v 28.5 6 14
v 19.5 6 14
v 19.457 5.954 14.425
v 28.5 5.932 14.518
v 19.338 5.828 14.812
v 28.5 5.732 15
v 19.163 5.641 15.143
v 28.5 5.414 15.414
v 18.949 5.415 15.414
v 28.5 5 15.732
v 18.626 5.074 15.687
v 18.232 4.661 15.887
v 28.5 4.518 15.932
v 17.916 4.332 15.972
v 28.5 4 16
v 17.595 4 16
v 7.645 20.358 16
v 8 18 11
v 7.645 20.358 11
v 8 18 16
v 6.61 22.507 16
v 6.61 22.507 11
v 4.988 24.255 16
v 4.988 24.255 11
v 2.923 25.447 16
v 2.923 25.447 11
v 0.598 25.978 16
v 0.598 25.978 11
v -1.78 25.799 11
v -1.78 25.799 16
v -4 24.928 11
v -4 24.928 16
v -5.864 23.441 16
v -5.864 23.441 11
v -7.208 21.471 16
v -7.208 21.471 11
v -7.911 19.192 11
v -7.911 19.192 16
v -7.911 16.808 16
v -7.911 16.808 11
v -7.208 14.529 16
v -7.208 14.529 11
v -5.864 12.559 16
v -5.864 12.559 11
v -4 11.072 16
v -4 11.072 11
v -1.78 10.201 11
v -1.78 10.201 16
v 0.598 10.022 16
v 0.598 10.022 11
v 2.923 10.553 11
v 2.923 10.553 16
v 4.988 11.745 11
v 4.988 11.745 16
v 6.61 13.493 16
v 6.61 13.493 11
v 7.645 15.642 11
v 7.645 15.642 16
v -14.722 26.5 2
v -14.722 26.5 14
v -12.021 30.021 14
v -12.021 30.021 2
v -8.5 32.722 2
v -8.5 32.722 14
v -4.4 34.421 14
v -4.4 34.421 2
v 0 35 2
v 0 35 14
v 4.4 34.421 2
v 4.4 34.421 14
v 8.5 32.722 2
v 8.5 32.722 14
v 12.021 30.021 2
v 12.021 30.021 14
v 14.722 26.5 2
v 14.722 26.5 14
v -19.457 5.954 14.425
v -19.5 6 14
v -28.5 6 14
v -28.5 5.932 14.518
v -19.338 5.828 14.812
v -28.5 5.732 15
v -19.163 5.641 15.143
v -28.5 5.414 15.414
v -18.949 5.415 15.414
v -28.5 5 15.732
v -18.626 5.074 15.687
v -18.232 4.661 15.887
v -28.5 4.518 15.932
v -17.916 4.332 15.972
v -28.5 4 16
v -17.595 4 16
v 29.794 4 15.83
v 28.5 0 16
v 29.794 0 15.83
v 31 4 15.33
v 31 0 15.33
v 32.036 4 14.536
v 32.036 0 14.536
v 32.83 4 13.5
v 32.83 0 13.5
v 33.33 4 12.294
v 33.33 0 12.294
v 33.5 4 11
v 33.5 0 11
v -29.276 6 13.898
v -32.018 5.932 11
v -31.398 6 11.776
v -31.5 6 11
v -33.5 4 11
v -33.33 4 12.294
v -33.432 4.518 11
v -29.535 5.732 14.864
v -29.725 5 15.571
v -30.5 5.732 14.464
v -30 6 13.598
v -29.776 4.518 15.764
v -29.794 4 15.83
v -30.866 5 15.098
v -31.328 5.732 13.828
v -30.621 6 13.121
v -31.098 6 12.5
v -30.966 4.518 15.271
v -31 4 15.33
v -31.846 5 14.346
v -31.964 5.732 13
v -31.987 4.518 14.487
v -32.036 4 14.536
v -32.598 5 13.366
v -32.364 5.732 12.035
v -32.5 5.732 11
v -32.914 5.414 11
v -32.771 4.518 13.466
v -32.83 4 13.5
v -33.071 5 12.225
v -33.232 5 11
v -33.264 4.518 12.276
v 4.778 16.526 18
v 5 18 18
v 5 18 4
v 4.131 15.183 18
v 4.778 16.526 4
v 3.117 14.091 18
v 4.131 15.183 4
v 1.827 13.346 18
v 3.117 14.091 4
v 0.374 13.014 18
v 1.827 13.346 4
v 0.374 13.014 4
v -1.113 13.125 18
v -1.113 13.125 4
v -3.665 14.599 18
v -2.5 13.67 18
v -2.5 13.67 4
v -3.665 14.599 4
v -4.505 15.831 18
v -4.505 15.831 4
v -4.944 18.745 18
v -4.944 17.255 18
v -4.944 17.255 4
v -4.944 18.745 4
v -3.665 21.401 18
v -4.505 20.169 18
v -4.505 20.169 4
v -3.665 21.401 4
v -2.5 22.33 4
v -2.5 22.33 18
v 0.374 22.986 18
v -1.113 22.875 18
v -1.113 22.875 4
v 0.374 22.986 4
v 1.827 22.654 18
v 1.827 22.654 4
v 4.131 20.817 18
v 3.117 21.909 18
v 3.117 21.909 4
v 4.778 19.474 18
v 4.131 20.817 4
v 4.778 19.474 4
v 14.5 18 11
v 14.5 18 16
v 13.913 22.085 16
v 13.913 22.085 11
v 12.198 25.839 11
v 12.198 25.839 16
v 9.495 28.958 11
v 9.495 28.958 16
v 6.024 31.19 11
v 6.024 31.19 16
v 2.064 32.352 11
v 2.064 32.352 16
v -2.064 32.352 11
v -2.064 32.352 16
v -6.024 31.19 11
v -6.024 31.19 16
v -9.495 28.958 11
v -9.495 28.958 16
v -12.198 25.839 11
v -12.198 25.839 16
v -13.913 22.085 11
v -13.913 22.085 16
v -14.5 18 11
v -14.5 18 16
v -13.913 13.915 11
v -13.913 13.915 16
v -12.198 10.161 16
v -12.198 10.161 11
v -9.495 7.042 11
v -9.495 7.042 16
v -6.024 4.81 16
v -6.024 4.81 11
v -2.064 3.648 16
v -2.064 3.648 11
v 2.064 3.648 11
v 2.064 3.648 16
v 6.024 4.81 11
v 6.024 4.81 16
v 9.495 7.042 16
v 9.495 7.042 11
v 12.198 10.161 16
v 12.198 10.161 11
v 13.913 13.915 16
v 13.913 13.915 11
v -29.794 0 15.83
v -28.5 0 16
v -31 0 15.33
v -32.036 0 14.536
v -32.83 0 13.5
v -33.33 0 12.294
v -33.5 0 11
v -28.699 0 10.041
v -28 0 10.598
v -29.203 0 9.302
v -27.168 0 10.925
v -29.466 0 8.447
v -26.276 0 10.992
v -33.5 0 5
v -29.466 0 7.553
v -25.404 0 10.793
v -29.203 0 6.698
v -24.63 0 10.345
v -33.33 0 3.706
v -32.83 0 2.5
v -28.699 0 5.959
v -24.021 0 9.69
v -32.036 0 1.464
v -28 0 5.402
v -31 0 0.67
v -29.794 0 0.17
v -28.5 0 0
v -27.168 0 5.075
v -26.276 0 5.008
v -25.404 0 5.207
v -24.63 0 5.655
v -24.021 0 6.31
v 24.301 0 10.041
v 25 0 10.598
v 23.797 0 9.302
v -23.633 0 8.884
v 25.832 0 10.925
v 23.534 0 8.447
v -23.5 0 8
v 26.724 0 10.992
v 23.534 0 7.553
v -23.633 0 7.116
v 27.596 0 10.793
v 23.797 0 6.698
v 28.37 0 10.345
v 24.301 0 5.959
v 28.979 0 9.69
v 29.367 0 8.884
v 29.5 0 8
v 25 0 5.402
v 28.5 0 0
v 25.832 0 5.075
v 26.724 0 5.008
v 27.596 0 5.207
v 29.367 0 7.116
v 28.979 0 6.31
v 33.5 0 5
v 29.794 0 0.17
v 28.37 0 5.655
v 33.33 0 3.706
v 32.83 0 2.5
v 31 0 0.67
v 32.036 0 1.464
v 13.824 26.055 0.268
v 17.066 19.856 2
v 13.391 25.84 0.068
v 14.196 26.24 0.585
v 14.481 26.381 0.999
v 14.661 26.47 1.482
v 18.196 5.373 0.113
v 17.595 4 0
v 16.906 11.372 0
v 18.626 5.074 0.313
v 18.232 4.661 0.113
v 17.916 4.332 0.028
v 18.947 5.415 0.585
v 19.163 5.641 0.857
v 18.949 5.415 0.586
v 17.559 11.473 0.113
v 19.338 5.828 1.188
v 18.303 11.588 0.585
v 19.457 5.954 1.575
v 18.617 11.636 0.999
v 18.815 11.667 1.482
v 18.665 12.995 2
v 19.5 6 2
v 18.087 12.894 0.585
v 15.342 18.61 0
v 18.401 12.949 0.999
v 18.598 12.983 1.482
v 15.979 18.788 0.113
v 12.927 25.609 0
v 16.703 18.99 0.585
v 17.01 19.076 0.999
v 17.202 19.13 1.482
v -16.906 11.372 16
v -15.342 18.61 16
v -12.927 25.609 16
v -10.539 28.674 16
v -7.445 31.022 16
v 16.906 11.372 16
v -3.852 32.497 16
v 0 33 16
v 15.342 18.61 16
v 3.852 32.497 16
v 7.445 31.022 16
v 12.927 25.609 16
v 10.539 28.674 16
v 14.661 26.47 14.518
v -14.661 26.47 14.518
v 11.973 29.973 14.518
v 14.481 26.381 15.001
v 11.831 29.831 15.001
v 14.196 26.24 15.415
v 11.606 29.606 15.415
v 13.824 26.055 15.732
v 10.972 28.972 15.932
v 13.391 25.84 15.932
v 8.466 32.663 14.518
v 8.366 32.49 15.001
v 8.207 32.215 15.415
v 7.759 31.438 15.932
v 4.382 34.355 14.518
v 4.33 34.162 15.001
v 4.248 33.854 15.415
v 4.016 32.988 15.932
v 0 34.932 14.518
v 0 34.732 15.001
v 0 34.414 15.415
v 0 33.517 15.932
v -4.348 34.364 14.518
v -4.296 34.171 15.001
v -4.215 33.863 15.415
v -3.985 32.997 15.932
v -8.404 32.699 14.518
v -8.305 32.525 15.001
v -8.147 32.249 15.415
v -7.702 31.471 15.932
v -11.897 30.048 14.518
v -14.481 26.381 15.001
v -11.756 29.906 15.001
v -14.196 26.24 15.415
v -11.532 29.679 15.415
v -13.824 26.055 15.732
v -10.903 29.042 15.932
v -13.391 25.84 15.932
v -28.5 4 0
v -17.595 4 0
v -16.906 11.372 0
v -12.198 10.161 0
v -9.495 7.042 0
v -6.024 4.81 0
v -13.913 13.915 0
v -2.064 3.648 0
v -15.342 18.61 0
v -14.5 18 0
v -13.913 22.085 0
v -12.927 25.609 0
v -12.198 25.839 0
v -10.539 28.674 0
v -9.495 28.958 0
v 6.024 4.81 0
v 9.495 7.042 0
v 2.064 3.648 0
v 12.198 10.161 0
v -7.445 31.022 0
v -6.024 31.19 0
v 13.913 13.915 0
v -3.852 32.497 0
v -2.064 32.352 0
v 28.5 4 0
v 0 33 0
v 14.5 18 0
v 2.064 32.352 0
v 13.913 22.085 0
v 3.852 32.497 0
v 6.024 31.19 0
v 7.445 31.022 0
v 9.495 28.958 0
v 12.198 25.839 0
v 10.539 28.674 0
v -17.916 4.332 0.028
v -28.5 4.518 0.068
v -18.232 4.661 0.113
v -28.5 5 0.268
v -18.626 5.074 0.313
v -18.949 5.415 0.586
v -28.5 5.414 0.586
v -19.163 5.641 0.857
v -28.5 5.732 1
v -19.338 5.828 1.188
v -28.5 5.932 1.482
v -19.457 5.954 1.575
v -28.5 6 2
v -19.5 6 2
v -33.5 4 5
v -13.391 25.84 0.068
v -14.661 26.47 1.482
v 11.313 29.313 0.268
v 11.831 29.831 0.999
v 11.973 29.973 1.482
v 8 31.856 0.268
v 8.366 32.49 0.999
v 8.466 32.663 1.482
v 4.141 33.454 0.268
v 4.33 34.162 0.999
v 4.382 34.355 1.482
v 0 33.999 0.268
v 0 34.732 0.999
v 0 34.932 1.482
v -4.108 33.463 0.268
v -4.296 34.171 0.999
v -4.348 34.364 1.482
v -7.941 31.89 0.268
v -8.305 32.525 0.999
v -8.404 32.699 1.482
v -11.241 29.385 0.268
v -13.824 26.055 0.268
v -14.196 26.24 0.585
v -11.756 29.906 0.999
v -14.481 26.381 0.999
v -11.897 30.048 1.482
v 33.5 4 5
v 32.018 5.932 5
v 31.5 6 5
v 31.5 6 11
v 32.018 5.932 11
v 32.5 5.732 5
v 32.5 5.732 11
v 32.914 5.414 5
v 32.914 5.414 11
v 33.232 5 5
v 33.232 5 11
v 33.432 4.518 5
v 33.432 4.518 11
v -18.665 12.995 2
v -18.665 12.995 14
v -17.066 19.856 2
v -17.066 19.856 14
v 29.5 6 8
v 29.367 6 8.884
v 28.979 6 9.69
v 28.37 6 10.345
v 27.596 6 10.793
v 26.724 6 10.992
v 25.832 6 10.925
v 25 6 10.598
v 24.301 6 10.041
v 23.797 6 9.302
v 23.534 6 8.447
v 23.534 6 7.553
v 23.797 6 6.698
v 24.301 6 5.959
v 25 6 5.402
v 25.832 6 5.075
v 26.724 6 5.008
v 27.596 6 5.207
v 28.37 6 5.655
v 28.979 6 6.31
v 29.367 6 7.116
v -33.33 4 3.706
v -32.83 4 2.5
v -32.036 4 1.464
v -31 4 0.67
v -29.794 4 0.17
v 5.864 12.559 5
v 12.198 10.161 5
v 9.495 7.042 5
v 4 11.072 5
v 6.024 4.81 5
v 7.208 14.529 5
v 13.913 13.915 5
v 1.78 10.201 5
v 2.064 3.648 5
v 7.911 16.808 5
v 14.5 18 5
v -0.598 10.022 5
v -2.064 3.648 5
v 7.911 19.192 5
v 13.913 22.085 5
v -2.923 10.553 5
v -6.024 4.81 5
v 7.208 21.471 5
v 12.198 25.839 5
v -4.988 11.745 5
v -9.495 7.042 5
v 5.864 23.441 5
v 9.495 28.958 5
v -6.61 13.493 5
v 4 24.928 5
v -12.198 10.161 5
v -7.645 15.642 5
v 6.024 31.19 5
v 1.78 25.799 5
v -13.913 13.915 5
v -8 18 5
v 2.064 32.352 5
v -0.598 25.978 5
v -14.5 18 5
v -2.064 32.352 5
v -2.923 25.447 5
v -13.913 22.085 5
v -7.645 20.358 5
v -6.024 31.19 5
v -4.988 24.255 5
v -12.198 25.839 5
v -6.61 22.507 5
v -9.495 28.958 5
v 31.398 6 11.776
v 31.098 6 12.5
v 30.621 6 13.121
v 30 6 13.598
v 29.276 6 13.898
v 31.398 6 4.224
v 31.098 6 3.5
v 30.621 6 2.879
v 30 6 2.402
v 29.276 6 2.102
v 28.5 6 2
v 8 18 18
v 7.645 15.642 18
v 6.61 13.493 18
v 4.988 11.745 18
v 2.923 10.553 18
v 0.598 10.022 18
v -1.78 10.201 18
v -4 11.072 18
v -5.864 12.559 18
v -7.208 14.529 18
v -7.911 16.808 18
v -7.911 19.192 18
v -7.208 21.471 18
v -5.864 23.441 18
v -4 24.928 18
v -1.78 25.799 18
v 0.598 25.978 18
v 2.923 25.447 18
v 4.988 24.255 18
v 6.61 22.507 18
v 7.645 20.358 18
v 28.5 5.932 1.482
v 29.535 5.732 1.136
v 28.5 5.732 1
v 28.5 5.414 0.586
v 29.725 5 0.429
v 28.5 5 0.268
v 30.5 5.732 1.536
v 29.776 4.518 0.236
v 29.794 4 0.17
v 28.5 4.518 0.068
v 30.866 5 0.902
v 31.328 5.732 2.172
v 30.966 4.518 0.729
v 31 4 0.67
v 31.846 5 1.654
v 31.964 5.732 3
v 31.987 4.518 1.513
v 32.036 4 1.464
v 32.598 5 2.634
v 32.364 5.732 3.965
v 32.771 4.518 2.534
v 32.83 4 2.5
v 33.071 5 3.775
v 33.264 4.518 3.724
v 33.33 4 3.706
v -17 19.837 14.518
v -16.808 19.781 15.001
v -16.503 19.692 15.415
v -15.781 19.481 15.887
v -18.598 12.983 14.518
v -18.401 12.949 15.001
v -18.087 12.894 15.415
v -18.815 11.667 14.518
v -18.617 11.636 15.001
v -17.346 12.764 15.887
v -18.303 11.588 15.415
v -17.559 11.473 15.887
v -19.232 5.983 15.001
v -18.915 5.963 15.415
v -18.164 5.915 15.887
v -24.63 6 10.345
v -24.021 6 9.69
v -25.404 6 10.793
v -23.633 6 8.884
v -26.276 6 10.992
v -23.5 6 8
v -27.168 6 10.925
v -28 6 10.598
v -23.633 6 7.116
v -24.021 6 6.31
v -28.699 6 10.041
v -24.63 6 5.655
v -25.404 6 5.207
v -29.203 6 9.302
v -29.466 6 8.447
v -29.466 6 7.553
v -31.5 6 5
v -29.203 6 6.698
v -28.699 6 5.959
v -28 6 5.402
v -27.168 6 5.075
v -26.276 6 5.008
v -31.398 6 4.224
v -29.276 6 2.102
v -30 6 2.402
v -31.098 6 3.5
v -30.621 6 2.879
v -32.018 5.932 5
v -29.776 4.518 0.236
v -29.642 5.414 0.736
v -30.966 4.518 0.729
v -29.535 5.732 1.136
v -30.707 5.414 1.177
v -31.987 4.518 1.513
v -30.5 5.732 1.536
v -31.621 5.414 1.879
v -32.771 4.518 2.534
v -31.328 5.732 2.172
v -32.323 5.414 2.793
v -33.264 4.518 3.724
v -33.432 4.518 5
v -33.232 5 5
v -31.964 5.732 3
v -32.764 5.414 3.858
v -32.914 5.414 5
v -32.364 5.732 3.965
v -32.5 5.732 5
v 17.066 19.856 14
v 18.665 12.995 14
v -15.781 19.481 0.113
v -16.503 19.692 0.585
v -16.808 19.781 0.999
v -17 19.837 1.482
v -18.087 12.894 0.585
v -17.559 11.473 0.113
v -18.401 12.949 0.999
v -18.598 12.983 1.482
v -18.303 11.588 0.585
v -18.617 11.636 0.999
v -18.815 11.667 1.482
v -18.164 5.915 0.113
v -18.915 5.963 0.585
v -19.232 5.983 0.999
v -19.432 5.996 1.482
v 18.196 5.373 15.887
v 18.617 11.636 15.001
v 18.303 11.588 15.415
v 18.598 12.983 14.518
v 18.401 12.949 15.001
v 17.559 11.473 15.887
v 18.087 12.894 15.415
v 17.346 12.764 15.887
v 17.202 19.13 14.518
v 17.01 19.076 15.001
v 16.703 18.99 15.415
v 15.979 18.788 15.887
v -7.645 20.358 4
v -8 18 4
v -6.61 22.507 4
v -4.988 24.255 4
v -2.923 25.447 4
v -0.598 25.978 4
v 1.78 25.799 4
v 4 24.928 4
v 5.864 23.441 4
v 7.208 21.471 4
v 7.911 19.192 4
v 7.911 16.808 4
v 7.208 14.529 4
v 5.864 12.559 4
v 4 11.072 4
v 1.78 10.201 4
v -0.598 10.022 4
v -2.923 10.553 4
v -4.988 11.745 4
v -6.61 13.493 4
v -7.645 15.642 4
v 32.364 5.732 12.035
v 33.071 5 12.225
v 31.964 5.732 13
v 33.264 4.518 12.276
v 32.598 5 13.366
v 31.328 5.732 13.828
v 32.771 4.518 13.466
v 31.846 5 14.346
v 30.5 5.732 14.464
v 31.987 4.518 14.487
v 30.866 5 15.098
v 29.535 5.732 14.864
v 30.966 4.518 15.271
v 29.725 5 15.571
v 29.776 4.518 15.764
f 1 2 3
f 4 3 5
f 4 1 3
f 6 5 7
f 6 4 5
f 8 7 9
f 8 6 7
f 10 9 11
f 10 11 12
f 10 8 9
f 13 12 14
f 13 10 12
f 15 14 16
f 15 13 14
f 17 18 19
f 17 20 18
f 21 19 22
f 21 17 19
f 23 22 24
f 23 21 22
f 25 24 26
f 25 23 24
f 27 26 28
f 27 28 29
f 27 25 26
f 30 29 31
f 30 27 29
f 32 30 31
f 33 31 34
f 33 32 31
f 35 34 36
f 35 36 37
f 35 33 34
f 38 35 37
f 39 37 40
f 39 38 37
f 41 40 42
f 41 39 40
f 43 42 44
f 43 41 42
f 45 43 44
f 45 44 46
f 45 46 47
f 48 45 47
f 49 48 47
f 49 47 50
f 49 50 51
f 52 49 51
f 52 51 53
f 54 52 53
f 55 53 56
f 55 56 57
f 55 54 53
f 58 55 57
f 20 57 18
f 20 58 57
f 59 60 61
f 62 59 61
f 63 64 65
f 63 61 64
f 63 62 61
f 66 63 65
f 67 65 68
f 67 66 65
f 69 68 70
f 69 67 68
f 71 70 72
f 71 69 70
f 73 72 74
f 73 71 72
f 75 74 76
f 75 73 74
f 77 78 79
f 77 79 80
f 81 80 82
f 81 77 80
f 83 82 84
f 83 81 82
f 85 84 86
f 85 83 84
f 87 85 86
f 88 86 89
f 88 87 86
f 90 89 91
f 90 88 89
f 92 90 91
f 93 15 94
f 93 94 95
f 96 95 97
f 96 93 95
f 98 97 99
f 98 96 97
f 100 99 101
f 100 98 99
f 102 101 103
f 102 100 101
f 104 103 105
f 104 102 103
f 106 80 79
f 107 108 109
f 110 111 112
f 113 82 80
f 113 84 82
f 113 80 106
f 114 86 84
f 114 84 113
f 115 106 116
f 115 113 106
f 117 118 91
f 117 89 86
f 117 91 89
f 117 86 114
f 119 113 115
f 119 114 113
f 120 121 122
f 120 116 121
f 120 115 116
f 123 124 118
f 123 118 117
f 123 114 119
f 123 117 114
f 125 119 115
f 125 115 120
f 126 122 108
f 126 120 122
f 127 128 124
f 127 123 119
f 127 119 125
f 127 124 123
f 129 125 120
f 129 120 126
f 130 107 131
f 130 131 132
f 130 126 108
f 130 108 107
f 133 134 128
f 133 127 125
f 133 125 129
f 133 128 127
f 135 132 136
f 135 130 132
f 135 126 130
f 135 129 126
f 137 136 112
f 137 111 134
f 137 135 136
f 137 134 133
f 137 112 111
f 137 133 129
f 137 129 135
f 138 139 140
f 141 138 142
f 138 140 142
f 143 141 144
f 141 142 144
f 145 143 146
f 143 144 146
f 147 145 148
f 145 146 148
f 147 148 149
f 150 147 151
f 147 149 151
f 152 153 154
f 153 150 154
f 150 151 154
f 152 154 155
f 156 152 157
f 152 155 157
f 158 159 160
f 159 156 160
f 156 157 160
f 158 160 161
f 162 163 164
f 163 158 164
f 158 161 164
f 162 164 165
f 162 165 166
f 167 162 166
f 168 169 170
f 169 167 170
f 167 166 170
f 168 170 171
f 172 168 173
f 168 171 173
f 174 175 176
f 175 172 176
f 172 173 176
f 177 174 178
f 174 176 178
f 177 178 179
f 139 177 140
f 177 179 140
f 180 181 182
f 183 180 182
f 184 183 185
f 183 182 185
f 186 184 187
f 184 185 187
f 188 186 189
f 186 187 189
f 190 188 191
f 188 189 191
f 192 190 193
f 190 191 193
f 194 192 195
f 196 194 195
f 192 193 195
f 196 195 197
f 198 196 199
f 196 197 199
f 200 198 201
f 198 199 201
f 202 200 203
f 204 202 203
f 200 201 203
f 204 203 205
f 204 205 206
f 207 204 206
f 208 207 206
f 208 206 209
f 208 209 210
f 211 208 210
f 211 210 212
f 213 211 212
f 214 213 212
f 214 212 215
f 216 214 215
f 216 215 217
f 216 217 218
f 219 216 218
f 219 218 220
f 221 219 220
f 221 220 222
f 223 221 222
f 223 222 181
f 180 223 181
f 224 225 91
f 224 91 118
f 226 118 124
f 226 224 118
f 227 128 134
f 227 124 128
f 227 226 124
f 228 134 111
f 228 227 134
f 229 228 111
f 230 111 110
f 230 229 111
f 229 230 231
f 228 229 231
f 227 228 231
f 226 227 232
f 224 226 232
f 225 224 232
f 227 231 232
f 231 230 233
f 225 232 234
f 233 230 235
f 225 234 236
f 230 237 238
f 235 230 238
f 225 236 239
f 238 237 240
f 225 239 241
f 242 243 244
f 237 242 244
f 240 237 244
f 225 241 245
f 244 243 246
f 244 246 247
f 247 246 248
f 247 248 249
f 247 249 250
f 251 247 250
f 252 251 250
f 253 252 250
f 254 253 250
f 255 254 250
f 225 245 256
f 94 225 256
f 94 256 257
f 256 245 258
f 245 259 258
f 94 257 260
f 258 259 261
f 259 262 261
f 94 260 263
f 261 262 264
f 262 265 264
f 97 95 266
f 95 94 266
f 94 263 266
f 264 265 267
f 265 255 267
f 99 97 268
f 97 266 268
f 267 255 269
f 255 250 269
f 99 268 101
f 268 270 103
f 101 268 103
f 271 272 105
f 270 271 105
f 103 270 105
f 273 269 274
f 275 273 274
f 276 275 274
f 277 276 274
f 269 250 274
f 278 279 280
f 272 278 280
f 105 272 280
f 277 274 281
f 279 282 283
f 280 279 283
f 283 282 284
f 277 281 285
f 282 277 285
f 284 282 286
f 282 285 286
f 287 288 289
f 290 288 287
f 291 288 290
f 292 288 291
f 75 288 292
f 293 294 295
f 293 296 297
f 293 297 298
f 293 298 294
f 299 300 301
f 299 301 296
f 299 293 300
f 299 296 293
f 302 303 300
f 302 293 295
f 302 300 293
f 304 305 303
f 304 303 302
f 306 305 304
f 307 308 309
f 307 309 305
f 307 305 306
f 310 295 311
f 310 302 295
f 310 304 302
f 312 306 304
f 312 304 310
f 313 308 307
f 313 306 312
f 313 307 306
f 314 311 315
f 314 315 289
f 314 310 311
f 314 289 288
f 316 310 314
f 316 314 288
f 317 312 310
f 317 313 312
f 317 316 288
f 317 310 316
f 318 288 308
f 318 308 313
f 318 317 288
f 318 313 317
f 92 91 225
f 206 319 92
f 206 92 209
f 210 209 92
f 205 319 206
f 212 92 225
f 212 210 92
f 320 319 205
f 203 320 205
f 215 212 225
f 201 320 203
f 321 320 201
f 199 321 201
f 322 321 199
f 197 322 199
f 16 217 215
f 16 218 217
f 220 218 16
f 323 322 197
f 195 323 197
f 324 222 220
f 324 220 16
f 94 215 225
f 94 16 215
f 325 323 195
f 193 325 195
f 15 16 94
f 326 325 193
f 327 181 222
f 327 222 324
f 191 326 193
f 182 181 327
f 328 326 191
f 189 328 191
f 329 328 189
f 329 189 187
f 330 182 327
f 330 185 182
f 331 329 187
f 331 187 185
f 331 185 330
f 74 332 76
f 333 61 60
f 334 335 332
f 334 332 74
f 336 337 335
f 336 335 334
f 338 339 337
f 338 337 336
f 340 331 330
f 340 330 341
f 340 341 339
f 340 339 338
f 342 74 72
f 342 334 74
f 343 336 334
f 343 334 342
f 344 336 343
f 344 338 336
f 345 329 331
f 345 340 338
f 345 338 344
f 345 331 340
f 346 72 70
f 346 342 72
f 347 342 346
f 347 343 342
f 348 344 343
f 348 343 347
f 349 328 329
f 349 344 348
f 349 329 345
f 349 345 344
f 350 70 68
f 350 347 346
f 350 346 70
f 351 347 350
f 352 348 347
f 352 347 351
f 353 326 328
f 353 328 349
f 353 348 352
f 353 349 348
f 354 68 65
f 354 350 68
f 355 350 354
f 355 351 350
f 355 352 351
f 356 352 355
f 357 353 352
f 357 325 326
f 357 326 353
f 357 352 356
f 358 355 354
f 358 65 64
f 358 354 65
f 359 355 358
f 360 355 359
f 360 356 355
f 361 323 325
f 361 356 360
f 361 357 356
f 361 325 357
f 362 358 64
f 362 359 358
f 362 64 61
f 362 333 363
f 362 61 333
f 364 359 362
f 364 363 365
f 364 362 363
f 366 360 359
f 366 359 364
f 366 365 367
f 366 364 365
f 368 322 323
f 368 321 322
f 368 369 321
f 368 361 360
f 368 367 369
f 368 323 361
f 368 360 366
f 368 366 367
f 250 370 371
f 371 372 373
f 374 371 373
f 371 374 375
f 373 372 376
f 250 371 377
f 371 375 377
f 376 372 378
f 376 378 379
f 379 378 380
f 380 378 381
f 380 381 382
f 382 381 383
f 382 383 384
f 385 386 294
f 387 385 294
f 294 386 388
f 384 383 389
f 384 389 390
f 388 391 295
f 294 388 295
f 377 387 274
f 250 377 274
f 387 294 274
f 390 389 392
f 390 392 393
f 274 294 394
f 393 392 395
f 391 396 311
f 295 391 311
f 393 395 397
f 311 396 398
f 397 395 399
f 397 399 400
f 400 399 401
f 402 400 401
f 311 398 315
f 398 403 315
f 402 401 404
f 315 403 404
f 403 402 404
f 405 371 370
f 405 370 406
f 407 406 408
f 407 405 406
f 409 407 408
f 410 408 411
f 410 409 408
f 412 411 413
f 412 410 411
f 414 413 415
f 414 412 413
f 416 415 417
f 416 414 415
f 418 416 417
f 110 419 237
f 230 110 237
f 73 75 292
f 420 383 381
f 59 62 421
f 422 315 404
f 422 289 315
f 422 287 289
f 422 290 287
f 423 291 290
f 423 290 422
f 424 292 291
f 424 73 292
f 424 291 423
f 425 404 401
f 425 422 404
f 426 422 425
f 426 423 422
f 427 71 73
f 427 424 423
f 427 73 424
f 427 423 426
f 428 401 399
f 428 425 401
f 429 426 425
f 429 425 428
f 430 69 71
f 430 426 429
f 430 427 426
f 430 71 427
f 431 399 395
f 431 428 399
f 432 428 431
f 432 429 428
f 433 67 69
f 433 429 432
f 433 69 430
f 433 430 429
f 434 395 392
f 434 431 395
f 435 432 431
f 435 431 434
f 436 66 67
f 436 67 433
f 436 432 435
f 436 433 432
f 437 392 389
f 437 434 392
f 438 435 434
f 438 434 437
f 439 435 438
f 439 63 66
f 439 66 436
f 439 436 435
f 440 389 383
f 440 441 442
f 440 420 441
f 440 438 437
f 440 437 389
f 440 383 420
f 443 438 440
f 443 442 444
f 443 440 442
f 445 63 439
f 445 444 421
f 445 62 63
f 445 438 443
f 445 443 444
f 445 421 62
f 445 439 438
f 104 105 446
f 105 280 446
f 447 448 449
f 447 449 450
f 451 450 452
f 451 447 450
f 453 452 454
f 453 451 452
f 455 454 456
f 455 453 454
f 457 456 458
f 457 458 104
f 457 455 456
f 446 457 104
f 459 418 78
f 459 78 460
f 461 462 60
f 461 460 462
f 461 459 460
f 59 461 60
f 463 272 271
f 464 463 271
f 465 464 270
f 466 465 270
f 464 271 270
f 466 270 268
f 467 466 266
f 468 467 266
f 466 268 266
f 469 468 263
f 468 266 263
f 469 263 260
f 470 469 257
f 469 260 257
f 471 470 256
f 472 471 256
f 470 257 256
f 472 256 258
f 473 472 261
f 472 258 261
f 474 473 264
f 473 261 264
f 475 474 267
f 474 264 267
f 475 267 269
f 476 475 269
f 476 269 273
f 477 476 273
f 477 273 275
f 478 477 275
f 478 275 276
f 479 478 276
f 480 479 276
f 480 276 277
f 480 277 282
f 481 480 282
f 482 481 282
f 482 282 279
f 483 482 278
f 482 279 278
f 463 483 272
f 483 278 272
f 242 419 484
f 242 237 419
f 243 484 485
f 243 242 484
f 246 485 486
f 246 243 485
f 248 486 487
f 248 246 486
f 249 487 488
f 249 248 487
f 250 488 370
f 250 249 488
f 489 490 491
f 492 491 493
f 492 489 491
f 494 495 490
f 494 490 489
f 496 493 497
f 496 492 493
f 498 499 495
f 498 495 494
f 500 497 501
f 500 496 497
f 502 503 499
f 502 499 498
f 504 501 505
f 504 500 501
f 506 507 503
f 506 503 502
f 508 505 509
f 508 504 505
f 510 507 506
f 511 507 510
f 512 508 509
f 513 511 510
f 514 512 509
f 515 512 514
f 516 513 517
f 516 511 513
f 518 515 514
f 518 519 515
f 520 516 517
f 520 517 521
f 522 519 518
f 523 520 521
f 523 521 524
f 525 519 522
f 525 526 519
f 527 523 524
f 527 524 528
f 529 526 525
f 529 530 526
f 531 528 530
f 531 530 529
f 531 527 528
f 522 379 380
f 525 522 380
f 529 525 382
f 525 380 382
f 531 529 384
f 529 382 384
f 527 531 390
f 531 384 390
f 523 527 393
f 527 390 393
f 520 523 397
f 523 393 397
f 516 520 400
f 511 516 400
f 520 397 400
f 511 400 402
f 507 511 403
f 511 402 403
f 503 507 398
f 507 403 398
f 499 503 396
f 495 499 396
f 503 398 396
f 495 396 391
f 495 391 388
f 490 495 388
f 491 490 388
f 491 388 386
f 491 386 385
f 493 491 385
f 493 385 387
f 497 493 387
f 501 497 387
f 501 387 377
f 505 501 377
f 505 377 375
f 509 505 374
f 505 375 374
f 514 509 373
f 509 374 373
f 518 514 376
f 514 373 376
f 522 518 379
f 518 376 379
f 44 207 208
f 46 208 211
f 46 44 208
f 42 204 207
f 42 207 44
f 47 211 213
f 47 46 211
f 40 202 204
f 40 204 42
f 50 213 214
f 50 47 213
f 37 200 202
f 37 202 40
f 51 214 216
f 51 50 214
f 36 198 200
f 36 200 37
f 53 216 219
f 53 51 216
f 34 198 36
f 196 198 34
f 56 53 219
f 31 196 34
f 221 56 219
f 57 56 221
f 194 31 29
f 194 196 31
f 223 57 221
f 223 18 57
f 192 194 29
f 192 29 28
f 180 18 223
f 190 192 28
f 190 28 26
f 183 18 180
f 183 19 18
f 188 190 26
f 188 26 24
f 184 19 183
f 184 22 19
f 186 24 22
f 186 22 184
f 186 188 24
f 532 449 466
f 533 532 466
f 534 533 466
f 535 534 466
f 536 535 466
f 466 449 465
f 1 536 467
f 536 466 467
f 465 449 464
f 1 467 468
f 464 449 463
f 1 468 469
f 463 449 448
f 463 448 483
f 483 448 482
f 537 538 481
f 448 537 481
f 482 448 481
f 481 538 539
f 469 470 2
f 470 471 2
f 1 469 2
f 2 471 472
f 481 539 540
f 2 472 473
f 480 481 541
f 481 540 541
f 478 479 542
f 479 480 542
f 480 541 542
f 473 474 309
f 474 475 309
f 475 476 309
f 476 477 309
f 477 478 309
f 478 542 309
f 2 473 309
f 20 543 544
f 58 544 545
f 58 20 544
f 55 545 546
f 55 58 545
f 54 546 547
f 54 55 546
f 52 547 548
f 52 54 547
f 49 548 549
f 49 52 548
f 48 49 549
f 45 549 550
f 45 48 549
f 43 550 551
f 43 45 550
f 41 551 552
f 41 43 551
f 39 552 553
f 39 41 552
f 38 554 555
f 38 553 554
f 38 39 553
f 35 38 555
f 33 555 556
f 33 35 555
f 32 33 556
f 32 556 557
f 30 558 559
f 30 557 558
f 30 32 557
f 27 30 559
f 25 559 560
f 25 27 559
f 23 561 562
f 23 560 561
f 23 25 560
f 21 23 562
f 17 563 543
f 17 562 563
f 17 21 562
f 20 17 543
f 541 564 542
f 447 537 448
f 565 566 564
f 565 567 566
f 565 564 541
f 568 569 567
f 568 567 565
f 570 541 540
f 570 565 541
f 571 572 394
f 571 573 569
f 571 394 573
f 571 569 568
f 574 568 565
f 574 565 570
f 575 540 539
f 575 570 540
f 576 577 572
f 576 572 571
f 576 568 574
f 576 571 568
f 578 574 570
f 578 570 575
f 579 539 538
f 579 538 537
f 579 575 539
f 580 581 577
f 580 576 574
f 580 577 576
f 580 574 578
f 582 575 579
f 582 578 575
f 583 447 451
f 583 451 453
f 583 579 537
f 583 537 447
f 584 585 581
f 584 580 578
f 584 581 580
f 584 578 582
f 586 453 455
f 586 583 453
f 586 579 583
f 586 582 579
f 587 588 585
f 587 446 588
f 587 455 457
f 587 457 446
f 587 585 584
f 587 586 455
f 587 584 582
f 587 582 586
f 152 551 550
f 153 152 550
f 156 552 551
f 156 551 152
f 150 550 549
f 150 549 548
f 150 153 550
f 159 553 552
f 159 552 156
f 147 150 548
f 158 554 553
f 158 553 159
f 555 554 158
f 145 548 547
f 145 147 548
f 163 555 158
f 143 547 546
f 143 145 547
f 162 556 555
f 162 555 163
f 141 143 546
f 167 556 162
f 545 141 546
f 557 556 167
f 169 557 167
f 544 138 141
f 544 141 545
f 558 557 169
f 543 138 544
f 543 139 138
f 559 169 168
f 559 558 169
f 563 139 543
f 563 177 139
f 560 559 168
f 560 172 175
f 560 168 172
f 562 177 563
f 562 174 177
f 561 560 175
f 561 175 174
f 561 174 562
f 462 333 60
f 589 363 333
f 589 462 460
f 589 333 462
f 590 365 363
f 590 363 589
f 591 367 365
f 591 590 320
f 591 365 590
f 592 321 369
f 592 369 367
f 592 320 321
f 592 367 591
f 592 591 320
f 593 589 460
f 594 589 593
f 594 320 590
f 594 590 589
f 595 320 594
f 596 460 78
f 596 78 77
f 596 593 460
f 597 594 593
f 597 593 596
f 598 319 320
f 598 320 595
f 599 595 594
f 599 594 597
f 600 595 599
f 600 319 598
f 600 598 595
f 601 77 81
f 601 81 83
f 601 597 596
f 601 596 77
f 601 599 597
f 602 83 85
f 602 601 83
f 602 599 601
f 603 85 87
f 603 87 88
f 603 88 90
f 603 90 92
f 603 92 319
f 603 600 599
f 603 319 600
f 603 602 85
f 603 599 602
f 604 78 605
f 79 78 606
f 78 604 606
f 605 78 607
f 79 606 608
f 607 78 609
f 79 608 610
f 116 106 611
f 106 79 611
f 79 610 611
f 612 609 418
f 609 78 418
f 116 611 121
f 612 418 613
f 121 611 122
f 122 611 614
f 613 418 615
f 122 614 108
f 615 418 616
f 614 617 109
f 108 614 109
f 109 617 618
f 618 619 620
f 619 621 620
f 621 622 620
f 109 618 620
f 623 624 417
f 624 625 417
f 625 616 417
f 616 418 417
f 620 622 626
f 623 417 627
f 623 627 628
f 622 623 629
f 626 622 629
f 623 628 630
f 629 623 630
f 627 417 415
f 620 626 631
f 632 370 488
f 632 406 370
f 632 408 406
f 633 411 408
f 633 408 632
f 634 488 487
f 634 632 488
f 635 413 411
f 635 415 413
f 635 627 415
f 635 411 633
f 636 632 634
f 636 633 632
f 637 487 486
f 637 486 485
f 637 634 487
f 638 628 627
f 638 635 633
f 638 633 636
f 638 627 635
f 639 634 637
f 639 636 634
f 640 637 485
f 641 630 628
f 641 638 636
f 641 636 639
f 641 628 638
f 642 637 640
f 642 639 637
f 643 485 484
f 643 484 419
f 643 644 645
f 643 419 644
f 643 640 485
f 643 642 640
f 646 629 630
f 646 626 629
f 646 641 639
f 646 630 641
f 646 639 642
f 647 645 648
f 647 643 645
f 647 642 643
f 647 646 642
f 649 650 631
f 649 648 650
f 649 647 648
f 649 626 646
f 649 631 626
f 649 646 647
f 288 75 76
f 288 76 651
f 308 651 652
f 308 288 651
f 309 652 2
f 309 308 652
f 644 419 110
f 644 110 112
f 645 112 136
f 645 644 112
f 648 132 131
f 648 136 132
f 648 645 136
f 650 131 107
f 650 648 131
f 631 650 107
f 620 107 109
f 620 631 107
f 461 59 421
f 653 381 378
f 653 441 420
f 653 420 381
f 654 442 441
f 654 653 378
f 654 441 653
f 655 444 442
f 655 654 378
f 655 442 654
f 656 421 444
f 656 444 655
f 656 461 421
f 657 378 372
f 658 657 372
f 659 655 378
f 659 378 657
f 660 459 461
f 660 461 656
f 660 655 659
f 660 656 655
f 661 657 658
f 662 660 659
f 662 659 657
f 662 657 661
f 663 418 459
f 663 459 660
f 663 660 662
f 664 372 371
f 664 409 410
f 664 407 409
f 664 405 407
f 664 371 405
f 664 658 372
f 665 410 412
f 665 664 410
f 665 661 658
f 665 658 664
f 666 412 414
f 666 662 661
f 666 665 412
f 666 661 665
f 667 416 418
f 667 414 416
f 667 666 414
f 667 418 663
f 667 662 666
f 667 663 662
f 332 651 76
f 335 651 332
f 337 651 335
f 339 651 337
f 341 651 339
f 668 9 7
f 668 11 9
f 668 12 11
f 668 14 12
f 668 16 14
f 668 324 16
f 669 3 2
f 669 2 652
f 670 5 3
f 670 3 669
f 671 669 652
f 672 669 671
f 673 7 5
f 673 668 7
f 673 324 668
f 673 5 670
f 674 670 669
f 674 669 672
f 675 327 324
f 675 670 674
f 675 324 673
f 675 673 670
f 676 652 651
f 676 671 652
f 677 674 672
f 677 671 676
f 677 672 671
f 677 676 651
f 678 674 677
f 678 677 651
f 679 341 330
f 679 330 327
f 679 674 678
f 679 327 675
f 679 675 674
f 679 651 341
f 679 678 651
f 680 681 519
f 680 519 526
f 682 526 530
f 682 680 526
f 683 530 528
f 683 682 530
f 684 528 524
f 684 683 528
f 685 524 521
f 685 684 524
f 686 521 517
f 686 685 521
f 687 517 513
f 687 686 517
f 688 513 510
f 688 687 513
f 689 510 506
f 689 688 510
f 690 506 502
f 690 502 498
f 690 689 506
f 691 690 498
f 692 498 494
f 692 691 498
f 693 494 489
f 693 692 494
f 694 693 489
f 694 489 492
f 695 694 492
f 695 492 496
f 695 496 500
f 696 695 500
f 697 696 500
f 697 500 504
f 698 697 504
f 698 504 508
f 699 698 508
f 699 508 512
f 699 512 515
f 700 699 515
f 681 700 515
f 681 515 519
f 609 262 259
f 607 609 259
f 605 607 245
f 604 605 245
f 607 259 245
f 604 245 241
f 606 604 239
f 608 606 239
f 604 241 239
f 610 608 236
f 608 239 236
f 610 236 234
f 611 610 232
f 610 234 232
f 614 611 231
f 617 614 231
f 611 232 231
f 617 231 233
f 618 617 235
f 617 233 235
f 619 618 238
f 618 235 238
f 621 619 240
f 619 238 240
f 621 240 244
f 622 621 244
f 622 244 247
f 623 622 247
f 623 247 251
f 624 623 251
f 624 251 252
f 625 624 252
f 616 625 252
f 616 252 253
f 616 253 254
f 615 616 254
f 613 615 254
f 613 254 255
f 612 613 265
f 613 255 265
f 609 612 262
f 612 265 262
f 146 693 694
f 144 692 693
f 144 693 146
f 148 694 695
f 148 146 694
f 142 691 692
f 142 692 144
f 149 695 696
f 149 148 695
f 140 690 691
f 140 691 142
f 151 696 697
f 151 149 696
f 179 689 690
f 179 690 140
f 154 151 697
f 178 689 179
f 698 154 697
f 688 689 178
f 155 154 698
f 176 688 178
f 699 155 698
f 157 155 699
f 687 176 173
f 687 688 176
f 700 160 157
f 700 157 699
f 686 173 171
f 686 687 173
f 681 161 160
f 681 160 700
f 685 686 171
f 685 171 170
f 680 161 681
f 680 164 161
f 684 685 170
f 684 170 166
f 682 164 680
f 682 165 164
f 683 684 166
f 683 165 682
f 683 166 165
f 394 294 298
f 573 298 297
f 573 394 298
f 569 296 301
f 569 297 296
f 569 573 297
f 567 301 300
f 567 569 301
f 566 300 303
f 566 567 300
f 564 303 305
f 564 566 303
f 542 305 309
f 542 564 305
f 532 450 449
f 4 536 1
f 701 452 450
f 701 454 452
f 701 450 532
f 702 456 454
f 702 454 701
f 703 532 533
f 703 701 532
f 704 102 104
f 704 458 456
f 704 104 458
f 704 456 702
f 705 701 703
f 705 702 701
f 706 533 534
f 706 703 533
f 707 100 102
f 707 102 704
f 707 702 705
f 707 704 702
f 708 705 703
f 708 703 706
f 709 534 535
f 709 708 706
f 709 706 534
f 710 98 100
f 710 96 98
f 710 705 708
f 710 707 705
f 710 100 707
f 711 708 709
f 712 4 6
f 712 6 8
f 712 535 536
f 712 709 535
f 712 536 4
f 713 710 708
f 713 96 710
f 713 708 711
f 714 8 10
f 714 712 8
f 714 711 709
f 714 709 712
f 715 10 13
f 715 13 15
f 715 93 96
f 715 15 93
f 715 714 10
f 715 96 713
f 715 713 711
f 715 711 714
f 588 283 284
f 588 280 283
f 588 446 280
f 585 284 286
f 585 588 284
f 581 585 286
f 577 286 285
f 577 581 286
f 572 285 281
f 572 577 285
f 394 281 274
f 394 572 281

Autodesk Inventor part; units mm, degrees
ref_plane "YZ Plane" through (0, 0, 0) normal (1, 0, 0) x (0, 1, 0)
ref_plane "XZ Plane" through (0, 0, 0) normal (0, 1, 0) x (-1, 0, 0)
sketch "Szkic1" plane through (0, 0, 0) normal (0, 0, 1) x (1, 0, 0)
  line L0 (0, 0) -> (33.5, 0)
  line L1 (0, 0) -> (-33.5, 0)
  circle A0 centre (0, 18) radius 5
  line L2 (-33.5, 0) -> (-33.5, 6)
  line L3 (33.5, 6) -> (33.5, 0)
  line L4 (-19.5, 6) -> (-26.5, 6)
  line L5 (19.5, 6) -> (26.5, 6)
  line L6 (-26.5, 6) -> (-19.5, 6)
  line L7 (26.5, 6) -> (19.5, 6)
  line L8 (0, 18) -> (-14.722432, 26.5) construction
  line L9 (0, 18) -> (0, 35) construction
  line L10 (0, 18) -> (14.722432, 26.5) construction
  line L11 (0, 18) -> (0, 35) construction
  arc A1 (19.5, 6) -> (14.722432, 26.5) centre (-44.369926, 1.921691) ccw
  line L12 (-33.5, 6) -> (-19.5, 6)
  line L13 (19.5, 6) -> (33.5, 6)
  arc A2 (-14.722432, 26.5) -> (-19.5, 6) centre (44.369926, 1.921691) ccw
  line L14 (-19.5, 6) -> (19.5, 6)
  line L15 (-14.722432, 26.5) -> (-14.722432, 6)
  line L16 (14.722432, 26.5) -> (14.722432, 6)
  arc A3 (0, 35) -> (-14.722432, 26.5) centre (0, 18) ccw
  arc A4 (14.722432, 26.5) -> (0, 35) centre (0, 18) ccw
  dimension "d0" = 33.5
  dimension "d1" = 33.5
  dimension "d2" = 35
  dimension "d4" = 10
  dimension "d5" = 6
  dimension "d9" = 7
  dimension "d10" = 7
  dimension "d11" = 60
  dimension "d12" = 60
  dimension "d14" = 64
  dimension "d15" = 64
sketch "Szkic1 outline for Wyciągnięcie proste1" plane through (0, 0, 0) normal (0, 0, 1) x (1, 0, 0)
  arc A0 (19.5, 6) -> (14.722432, 26.5) centre (-44.369926, 1.921691) ccw
  arc A1 (14.722432, 26.5) -> (-14.722432, 26.5) centre (0, 18) ccw
  arc A2 (-14.722432, 26.5) -> (-19.5, 6) centre (44.369926, 1.921691) ccw
  line L0 (-19.5, 6) -> (-33.5, 6)
  line L1 (-33.5, 6) -> (-33.5, 0)
  line L2 (-33.5, 0) -> (33.5, 0)
  line L3 (33.5, 0) -> (33.5, 6)
  line L4 (33.5, 6) -> (19.5, 6)
  circle A3 centre (0, 18) radius 5
extrude "Wyciągnięcie proste1" add sketch "Szkic1 outline for Wyciągnięcie proste1" along normal blind 16
sketch "Szkic2" plane through (-33.5, 0, 0) normal (0, -1, 0) x (1, 0, 0)
  circle A0 centre (7, 8) radius 3
  circle A1 centre (60, 8) radius 3
sketch "Szkic2 outline for Wyciągnięcie proste2" plane through (-33.5, 0, 0) normal (0, -1, 0) x (1, 0, 0)
  circle A0 centre (7, 8) radius 3
  circle A1 centre (60, 8) radius 3
extrude "Wyciągnięcie proste2" cut sketch "Szkic2 outline for Wyciągnięcie proste2" against normal up to next
ref_plane "Płaszczyzna konstrukcyjna1" through (0, 0, 8) normal (0, 0, 1) x (1, 0, 0)
sketch "Szkic3" plane through (0, 0, 8) normal (0, 0, 1) x (1, 0, 0)
  circle A0 centre (0, 18) radius 5 projected
  circle A1 centre (0, 18) radius 8
  point P0 (0, 0)
  dimension "d28" = 16
sketch "Szkic3 outline for Wyciągnięcie proste3" plane through (0, 0, 8) normal (0, 0, 1) x (1, 0, 0)
  circle A0 centre (0, 18) radius 8
  circle A1 centre (0, 18) radius 5
extrude "Wyciągnięcie proste3" add sketch "Szkic3 outline for Wyciągnięcie proste3" along normal blind 10
sketch "Szkic4" plane through (0, 0, 16) normal (0, 0, 1) x (1, 0, 0)
  arc A0 (-14.722432, 26.5) -> (-19.5, 6) centre (44.369926, 1.921691) ccw
  arc A1 (14.722432, 26.5) -> (-14.722432, 26.5) centre (0, 18) ccw
  arc A2 (19.5, 6) -> (14.722432, 26.5) centre (-44.369926, 1.921691) ccw
  arc A3 (-16.750014, 20.904656) -> (16.750014, 20.904656) centre (0, 18) ccw
  circle A4 centre (0, 18) radius 14.5
  circle A5 centre (0, 18) radius 8
  point P0 (0, 0)
  dimension "d31" = 29
sketch "Szkic4 outline for Wyciągnięcie proste4" plane through (0, 0, 16) normal (0, 0, 1) x (1, 0, 0)
  circle A0 centre (0, 18) radius 14.5
  circle A1 centre (0, 18) radius 8
extrude "Wyciągnięcie proste4" cut sketch "Szkic4 outline for Wyciągnięcie proste4" against normal blind 5
sketch "Szkic5" plane through (0, 0, 0) normal (0, 0, -1) x (-1, 0, 0)
  circle A0 centre (0, 18) radius 5
  circle A1 centre (0, 18) radius 8
  arc A2 (14.722432, 26.5) -> (-14.722432, 26.5) centre (0, 18) ccw
  arc A3 (19.5, 6) -> (14.722432, 26.5) centre (-44.369926, 1.921691) ccw
  arc A4 (-14.722432, 26.5) -> (-19.5, 6) centre (44.369926, 1.921691) ccw
  arc A5 (-14.722432, 26.5) -> (-19.5, 6) centre (44.369926, 1.921691) ccw
  arc A6 (19.5, 6) -> (14.722432, 26.5) centre (-44.369926, 1.921691) ccw
  arc A7 (-16.750014, 20.904656) -> (16.750014, 20.904656) centre (0, 18) ccw
  circle A8 centre (0, 18) radius 14.5
  point P0 (0, 0)
  dimension "d34" = 16
  dimension "d35" = 29
sketch "Szkic5 outline for Wyciągnięcie proste5" plane through (0, 0, 0) normal (0, 0, -1) x (-1, 0, 0)
  circle A0 centre (0, 18) radius 14.5
  circle A1 centre (0, 18) radius 8
extrude "Wyciągnięcie proste5" cut sketch "Szkic5 outline for Wyciągnięcie proste5" against normal blind 5
sketch "Szkic6" plane through (0, 18, 0) normal (0, 0, -1) x (-1, 0, 0)
  circle A0 centre (0, 0) radius 8 projected
  circle A1 centre (0, 0) radius 5 projected
  point P0 (0, -18)
sketch "Szkic6 outline for Wyciągnięcie proste6" plane through (0, 18, 0) normal (0, 0, -1) x (-1, 0, 0)
  circle A0 centre (0, 0) radius 8
  circle A1 centre (0, 0) radius 5
extrude "Wyciągnięcie proste6" cut sketch "Szkic6 outline for Wyciągnięcie proste6" against normal blind 4
fillet "Zaokrąglenie1" radius 5 4 edges at (-33.5, 3, 16) (-33.5, 3, 0) (33.5, 3, 16) (33.5, 3, 0)
fillet "Zaokrąglenie2" radius 2 14 edges at (17.9598, 16.4478, 16) (0, 35, 16) (-17.9598, 16.4478, 16) (32.0355, 6, 14.5355) (33.5, 6, 8) (32.0355, 6, 1.4645) (-24, 6, 0) (24, 6, 16) (-32.0355, 6, 14.5355) (-33.5, 6, 8) (-32.0355, 6, 1.4645) (0, 35, 0) (-17.9598, 16.4478, 0) (17.9598, 16.4478, 0)
properties part number "Łożysko w obudowie aluminiowej 10mm KP000"
